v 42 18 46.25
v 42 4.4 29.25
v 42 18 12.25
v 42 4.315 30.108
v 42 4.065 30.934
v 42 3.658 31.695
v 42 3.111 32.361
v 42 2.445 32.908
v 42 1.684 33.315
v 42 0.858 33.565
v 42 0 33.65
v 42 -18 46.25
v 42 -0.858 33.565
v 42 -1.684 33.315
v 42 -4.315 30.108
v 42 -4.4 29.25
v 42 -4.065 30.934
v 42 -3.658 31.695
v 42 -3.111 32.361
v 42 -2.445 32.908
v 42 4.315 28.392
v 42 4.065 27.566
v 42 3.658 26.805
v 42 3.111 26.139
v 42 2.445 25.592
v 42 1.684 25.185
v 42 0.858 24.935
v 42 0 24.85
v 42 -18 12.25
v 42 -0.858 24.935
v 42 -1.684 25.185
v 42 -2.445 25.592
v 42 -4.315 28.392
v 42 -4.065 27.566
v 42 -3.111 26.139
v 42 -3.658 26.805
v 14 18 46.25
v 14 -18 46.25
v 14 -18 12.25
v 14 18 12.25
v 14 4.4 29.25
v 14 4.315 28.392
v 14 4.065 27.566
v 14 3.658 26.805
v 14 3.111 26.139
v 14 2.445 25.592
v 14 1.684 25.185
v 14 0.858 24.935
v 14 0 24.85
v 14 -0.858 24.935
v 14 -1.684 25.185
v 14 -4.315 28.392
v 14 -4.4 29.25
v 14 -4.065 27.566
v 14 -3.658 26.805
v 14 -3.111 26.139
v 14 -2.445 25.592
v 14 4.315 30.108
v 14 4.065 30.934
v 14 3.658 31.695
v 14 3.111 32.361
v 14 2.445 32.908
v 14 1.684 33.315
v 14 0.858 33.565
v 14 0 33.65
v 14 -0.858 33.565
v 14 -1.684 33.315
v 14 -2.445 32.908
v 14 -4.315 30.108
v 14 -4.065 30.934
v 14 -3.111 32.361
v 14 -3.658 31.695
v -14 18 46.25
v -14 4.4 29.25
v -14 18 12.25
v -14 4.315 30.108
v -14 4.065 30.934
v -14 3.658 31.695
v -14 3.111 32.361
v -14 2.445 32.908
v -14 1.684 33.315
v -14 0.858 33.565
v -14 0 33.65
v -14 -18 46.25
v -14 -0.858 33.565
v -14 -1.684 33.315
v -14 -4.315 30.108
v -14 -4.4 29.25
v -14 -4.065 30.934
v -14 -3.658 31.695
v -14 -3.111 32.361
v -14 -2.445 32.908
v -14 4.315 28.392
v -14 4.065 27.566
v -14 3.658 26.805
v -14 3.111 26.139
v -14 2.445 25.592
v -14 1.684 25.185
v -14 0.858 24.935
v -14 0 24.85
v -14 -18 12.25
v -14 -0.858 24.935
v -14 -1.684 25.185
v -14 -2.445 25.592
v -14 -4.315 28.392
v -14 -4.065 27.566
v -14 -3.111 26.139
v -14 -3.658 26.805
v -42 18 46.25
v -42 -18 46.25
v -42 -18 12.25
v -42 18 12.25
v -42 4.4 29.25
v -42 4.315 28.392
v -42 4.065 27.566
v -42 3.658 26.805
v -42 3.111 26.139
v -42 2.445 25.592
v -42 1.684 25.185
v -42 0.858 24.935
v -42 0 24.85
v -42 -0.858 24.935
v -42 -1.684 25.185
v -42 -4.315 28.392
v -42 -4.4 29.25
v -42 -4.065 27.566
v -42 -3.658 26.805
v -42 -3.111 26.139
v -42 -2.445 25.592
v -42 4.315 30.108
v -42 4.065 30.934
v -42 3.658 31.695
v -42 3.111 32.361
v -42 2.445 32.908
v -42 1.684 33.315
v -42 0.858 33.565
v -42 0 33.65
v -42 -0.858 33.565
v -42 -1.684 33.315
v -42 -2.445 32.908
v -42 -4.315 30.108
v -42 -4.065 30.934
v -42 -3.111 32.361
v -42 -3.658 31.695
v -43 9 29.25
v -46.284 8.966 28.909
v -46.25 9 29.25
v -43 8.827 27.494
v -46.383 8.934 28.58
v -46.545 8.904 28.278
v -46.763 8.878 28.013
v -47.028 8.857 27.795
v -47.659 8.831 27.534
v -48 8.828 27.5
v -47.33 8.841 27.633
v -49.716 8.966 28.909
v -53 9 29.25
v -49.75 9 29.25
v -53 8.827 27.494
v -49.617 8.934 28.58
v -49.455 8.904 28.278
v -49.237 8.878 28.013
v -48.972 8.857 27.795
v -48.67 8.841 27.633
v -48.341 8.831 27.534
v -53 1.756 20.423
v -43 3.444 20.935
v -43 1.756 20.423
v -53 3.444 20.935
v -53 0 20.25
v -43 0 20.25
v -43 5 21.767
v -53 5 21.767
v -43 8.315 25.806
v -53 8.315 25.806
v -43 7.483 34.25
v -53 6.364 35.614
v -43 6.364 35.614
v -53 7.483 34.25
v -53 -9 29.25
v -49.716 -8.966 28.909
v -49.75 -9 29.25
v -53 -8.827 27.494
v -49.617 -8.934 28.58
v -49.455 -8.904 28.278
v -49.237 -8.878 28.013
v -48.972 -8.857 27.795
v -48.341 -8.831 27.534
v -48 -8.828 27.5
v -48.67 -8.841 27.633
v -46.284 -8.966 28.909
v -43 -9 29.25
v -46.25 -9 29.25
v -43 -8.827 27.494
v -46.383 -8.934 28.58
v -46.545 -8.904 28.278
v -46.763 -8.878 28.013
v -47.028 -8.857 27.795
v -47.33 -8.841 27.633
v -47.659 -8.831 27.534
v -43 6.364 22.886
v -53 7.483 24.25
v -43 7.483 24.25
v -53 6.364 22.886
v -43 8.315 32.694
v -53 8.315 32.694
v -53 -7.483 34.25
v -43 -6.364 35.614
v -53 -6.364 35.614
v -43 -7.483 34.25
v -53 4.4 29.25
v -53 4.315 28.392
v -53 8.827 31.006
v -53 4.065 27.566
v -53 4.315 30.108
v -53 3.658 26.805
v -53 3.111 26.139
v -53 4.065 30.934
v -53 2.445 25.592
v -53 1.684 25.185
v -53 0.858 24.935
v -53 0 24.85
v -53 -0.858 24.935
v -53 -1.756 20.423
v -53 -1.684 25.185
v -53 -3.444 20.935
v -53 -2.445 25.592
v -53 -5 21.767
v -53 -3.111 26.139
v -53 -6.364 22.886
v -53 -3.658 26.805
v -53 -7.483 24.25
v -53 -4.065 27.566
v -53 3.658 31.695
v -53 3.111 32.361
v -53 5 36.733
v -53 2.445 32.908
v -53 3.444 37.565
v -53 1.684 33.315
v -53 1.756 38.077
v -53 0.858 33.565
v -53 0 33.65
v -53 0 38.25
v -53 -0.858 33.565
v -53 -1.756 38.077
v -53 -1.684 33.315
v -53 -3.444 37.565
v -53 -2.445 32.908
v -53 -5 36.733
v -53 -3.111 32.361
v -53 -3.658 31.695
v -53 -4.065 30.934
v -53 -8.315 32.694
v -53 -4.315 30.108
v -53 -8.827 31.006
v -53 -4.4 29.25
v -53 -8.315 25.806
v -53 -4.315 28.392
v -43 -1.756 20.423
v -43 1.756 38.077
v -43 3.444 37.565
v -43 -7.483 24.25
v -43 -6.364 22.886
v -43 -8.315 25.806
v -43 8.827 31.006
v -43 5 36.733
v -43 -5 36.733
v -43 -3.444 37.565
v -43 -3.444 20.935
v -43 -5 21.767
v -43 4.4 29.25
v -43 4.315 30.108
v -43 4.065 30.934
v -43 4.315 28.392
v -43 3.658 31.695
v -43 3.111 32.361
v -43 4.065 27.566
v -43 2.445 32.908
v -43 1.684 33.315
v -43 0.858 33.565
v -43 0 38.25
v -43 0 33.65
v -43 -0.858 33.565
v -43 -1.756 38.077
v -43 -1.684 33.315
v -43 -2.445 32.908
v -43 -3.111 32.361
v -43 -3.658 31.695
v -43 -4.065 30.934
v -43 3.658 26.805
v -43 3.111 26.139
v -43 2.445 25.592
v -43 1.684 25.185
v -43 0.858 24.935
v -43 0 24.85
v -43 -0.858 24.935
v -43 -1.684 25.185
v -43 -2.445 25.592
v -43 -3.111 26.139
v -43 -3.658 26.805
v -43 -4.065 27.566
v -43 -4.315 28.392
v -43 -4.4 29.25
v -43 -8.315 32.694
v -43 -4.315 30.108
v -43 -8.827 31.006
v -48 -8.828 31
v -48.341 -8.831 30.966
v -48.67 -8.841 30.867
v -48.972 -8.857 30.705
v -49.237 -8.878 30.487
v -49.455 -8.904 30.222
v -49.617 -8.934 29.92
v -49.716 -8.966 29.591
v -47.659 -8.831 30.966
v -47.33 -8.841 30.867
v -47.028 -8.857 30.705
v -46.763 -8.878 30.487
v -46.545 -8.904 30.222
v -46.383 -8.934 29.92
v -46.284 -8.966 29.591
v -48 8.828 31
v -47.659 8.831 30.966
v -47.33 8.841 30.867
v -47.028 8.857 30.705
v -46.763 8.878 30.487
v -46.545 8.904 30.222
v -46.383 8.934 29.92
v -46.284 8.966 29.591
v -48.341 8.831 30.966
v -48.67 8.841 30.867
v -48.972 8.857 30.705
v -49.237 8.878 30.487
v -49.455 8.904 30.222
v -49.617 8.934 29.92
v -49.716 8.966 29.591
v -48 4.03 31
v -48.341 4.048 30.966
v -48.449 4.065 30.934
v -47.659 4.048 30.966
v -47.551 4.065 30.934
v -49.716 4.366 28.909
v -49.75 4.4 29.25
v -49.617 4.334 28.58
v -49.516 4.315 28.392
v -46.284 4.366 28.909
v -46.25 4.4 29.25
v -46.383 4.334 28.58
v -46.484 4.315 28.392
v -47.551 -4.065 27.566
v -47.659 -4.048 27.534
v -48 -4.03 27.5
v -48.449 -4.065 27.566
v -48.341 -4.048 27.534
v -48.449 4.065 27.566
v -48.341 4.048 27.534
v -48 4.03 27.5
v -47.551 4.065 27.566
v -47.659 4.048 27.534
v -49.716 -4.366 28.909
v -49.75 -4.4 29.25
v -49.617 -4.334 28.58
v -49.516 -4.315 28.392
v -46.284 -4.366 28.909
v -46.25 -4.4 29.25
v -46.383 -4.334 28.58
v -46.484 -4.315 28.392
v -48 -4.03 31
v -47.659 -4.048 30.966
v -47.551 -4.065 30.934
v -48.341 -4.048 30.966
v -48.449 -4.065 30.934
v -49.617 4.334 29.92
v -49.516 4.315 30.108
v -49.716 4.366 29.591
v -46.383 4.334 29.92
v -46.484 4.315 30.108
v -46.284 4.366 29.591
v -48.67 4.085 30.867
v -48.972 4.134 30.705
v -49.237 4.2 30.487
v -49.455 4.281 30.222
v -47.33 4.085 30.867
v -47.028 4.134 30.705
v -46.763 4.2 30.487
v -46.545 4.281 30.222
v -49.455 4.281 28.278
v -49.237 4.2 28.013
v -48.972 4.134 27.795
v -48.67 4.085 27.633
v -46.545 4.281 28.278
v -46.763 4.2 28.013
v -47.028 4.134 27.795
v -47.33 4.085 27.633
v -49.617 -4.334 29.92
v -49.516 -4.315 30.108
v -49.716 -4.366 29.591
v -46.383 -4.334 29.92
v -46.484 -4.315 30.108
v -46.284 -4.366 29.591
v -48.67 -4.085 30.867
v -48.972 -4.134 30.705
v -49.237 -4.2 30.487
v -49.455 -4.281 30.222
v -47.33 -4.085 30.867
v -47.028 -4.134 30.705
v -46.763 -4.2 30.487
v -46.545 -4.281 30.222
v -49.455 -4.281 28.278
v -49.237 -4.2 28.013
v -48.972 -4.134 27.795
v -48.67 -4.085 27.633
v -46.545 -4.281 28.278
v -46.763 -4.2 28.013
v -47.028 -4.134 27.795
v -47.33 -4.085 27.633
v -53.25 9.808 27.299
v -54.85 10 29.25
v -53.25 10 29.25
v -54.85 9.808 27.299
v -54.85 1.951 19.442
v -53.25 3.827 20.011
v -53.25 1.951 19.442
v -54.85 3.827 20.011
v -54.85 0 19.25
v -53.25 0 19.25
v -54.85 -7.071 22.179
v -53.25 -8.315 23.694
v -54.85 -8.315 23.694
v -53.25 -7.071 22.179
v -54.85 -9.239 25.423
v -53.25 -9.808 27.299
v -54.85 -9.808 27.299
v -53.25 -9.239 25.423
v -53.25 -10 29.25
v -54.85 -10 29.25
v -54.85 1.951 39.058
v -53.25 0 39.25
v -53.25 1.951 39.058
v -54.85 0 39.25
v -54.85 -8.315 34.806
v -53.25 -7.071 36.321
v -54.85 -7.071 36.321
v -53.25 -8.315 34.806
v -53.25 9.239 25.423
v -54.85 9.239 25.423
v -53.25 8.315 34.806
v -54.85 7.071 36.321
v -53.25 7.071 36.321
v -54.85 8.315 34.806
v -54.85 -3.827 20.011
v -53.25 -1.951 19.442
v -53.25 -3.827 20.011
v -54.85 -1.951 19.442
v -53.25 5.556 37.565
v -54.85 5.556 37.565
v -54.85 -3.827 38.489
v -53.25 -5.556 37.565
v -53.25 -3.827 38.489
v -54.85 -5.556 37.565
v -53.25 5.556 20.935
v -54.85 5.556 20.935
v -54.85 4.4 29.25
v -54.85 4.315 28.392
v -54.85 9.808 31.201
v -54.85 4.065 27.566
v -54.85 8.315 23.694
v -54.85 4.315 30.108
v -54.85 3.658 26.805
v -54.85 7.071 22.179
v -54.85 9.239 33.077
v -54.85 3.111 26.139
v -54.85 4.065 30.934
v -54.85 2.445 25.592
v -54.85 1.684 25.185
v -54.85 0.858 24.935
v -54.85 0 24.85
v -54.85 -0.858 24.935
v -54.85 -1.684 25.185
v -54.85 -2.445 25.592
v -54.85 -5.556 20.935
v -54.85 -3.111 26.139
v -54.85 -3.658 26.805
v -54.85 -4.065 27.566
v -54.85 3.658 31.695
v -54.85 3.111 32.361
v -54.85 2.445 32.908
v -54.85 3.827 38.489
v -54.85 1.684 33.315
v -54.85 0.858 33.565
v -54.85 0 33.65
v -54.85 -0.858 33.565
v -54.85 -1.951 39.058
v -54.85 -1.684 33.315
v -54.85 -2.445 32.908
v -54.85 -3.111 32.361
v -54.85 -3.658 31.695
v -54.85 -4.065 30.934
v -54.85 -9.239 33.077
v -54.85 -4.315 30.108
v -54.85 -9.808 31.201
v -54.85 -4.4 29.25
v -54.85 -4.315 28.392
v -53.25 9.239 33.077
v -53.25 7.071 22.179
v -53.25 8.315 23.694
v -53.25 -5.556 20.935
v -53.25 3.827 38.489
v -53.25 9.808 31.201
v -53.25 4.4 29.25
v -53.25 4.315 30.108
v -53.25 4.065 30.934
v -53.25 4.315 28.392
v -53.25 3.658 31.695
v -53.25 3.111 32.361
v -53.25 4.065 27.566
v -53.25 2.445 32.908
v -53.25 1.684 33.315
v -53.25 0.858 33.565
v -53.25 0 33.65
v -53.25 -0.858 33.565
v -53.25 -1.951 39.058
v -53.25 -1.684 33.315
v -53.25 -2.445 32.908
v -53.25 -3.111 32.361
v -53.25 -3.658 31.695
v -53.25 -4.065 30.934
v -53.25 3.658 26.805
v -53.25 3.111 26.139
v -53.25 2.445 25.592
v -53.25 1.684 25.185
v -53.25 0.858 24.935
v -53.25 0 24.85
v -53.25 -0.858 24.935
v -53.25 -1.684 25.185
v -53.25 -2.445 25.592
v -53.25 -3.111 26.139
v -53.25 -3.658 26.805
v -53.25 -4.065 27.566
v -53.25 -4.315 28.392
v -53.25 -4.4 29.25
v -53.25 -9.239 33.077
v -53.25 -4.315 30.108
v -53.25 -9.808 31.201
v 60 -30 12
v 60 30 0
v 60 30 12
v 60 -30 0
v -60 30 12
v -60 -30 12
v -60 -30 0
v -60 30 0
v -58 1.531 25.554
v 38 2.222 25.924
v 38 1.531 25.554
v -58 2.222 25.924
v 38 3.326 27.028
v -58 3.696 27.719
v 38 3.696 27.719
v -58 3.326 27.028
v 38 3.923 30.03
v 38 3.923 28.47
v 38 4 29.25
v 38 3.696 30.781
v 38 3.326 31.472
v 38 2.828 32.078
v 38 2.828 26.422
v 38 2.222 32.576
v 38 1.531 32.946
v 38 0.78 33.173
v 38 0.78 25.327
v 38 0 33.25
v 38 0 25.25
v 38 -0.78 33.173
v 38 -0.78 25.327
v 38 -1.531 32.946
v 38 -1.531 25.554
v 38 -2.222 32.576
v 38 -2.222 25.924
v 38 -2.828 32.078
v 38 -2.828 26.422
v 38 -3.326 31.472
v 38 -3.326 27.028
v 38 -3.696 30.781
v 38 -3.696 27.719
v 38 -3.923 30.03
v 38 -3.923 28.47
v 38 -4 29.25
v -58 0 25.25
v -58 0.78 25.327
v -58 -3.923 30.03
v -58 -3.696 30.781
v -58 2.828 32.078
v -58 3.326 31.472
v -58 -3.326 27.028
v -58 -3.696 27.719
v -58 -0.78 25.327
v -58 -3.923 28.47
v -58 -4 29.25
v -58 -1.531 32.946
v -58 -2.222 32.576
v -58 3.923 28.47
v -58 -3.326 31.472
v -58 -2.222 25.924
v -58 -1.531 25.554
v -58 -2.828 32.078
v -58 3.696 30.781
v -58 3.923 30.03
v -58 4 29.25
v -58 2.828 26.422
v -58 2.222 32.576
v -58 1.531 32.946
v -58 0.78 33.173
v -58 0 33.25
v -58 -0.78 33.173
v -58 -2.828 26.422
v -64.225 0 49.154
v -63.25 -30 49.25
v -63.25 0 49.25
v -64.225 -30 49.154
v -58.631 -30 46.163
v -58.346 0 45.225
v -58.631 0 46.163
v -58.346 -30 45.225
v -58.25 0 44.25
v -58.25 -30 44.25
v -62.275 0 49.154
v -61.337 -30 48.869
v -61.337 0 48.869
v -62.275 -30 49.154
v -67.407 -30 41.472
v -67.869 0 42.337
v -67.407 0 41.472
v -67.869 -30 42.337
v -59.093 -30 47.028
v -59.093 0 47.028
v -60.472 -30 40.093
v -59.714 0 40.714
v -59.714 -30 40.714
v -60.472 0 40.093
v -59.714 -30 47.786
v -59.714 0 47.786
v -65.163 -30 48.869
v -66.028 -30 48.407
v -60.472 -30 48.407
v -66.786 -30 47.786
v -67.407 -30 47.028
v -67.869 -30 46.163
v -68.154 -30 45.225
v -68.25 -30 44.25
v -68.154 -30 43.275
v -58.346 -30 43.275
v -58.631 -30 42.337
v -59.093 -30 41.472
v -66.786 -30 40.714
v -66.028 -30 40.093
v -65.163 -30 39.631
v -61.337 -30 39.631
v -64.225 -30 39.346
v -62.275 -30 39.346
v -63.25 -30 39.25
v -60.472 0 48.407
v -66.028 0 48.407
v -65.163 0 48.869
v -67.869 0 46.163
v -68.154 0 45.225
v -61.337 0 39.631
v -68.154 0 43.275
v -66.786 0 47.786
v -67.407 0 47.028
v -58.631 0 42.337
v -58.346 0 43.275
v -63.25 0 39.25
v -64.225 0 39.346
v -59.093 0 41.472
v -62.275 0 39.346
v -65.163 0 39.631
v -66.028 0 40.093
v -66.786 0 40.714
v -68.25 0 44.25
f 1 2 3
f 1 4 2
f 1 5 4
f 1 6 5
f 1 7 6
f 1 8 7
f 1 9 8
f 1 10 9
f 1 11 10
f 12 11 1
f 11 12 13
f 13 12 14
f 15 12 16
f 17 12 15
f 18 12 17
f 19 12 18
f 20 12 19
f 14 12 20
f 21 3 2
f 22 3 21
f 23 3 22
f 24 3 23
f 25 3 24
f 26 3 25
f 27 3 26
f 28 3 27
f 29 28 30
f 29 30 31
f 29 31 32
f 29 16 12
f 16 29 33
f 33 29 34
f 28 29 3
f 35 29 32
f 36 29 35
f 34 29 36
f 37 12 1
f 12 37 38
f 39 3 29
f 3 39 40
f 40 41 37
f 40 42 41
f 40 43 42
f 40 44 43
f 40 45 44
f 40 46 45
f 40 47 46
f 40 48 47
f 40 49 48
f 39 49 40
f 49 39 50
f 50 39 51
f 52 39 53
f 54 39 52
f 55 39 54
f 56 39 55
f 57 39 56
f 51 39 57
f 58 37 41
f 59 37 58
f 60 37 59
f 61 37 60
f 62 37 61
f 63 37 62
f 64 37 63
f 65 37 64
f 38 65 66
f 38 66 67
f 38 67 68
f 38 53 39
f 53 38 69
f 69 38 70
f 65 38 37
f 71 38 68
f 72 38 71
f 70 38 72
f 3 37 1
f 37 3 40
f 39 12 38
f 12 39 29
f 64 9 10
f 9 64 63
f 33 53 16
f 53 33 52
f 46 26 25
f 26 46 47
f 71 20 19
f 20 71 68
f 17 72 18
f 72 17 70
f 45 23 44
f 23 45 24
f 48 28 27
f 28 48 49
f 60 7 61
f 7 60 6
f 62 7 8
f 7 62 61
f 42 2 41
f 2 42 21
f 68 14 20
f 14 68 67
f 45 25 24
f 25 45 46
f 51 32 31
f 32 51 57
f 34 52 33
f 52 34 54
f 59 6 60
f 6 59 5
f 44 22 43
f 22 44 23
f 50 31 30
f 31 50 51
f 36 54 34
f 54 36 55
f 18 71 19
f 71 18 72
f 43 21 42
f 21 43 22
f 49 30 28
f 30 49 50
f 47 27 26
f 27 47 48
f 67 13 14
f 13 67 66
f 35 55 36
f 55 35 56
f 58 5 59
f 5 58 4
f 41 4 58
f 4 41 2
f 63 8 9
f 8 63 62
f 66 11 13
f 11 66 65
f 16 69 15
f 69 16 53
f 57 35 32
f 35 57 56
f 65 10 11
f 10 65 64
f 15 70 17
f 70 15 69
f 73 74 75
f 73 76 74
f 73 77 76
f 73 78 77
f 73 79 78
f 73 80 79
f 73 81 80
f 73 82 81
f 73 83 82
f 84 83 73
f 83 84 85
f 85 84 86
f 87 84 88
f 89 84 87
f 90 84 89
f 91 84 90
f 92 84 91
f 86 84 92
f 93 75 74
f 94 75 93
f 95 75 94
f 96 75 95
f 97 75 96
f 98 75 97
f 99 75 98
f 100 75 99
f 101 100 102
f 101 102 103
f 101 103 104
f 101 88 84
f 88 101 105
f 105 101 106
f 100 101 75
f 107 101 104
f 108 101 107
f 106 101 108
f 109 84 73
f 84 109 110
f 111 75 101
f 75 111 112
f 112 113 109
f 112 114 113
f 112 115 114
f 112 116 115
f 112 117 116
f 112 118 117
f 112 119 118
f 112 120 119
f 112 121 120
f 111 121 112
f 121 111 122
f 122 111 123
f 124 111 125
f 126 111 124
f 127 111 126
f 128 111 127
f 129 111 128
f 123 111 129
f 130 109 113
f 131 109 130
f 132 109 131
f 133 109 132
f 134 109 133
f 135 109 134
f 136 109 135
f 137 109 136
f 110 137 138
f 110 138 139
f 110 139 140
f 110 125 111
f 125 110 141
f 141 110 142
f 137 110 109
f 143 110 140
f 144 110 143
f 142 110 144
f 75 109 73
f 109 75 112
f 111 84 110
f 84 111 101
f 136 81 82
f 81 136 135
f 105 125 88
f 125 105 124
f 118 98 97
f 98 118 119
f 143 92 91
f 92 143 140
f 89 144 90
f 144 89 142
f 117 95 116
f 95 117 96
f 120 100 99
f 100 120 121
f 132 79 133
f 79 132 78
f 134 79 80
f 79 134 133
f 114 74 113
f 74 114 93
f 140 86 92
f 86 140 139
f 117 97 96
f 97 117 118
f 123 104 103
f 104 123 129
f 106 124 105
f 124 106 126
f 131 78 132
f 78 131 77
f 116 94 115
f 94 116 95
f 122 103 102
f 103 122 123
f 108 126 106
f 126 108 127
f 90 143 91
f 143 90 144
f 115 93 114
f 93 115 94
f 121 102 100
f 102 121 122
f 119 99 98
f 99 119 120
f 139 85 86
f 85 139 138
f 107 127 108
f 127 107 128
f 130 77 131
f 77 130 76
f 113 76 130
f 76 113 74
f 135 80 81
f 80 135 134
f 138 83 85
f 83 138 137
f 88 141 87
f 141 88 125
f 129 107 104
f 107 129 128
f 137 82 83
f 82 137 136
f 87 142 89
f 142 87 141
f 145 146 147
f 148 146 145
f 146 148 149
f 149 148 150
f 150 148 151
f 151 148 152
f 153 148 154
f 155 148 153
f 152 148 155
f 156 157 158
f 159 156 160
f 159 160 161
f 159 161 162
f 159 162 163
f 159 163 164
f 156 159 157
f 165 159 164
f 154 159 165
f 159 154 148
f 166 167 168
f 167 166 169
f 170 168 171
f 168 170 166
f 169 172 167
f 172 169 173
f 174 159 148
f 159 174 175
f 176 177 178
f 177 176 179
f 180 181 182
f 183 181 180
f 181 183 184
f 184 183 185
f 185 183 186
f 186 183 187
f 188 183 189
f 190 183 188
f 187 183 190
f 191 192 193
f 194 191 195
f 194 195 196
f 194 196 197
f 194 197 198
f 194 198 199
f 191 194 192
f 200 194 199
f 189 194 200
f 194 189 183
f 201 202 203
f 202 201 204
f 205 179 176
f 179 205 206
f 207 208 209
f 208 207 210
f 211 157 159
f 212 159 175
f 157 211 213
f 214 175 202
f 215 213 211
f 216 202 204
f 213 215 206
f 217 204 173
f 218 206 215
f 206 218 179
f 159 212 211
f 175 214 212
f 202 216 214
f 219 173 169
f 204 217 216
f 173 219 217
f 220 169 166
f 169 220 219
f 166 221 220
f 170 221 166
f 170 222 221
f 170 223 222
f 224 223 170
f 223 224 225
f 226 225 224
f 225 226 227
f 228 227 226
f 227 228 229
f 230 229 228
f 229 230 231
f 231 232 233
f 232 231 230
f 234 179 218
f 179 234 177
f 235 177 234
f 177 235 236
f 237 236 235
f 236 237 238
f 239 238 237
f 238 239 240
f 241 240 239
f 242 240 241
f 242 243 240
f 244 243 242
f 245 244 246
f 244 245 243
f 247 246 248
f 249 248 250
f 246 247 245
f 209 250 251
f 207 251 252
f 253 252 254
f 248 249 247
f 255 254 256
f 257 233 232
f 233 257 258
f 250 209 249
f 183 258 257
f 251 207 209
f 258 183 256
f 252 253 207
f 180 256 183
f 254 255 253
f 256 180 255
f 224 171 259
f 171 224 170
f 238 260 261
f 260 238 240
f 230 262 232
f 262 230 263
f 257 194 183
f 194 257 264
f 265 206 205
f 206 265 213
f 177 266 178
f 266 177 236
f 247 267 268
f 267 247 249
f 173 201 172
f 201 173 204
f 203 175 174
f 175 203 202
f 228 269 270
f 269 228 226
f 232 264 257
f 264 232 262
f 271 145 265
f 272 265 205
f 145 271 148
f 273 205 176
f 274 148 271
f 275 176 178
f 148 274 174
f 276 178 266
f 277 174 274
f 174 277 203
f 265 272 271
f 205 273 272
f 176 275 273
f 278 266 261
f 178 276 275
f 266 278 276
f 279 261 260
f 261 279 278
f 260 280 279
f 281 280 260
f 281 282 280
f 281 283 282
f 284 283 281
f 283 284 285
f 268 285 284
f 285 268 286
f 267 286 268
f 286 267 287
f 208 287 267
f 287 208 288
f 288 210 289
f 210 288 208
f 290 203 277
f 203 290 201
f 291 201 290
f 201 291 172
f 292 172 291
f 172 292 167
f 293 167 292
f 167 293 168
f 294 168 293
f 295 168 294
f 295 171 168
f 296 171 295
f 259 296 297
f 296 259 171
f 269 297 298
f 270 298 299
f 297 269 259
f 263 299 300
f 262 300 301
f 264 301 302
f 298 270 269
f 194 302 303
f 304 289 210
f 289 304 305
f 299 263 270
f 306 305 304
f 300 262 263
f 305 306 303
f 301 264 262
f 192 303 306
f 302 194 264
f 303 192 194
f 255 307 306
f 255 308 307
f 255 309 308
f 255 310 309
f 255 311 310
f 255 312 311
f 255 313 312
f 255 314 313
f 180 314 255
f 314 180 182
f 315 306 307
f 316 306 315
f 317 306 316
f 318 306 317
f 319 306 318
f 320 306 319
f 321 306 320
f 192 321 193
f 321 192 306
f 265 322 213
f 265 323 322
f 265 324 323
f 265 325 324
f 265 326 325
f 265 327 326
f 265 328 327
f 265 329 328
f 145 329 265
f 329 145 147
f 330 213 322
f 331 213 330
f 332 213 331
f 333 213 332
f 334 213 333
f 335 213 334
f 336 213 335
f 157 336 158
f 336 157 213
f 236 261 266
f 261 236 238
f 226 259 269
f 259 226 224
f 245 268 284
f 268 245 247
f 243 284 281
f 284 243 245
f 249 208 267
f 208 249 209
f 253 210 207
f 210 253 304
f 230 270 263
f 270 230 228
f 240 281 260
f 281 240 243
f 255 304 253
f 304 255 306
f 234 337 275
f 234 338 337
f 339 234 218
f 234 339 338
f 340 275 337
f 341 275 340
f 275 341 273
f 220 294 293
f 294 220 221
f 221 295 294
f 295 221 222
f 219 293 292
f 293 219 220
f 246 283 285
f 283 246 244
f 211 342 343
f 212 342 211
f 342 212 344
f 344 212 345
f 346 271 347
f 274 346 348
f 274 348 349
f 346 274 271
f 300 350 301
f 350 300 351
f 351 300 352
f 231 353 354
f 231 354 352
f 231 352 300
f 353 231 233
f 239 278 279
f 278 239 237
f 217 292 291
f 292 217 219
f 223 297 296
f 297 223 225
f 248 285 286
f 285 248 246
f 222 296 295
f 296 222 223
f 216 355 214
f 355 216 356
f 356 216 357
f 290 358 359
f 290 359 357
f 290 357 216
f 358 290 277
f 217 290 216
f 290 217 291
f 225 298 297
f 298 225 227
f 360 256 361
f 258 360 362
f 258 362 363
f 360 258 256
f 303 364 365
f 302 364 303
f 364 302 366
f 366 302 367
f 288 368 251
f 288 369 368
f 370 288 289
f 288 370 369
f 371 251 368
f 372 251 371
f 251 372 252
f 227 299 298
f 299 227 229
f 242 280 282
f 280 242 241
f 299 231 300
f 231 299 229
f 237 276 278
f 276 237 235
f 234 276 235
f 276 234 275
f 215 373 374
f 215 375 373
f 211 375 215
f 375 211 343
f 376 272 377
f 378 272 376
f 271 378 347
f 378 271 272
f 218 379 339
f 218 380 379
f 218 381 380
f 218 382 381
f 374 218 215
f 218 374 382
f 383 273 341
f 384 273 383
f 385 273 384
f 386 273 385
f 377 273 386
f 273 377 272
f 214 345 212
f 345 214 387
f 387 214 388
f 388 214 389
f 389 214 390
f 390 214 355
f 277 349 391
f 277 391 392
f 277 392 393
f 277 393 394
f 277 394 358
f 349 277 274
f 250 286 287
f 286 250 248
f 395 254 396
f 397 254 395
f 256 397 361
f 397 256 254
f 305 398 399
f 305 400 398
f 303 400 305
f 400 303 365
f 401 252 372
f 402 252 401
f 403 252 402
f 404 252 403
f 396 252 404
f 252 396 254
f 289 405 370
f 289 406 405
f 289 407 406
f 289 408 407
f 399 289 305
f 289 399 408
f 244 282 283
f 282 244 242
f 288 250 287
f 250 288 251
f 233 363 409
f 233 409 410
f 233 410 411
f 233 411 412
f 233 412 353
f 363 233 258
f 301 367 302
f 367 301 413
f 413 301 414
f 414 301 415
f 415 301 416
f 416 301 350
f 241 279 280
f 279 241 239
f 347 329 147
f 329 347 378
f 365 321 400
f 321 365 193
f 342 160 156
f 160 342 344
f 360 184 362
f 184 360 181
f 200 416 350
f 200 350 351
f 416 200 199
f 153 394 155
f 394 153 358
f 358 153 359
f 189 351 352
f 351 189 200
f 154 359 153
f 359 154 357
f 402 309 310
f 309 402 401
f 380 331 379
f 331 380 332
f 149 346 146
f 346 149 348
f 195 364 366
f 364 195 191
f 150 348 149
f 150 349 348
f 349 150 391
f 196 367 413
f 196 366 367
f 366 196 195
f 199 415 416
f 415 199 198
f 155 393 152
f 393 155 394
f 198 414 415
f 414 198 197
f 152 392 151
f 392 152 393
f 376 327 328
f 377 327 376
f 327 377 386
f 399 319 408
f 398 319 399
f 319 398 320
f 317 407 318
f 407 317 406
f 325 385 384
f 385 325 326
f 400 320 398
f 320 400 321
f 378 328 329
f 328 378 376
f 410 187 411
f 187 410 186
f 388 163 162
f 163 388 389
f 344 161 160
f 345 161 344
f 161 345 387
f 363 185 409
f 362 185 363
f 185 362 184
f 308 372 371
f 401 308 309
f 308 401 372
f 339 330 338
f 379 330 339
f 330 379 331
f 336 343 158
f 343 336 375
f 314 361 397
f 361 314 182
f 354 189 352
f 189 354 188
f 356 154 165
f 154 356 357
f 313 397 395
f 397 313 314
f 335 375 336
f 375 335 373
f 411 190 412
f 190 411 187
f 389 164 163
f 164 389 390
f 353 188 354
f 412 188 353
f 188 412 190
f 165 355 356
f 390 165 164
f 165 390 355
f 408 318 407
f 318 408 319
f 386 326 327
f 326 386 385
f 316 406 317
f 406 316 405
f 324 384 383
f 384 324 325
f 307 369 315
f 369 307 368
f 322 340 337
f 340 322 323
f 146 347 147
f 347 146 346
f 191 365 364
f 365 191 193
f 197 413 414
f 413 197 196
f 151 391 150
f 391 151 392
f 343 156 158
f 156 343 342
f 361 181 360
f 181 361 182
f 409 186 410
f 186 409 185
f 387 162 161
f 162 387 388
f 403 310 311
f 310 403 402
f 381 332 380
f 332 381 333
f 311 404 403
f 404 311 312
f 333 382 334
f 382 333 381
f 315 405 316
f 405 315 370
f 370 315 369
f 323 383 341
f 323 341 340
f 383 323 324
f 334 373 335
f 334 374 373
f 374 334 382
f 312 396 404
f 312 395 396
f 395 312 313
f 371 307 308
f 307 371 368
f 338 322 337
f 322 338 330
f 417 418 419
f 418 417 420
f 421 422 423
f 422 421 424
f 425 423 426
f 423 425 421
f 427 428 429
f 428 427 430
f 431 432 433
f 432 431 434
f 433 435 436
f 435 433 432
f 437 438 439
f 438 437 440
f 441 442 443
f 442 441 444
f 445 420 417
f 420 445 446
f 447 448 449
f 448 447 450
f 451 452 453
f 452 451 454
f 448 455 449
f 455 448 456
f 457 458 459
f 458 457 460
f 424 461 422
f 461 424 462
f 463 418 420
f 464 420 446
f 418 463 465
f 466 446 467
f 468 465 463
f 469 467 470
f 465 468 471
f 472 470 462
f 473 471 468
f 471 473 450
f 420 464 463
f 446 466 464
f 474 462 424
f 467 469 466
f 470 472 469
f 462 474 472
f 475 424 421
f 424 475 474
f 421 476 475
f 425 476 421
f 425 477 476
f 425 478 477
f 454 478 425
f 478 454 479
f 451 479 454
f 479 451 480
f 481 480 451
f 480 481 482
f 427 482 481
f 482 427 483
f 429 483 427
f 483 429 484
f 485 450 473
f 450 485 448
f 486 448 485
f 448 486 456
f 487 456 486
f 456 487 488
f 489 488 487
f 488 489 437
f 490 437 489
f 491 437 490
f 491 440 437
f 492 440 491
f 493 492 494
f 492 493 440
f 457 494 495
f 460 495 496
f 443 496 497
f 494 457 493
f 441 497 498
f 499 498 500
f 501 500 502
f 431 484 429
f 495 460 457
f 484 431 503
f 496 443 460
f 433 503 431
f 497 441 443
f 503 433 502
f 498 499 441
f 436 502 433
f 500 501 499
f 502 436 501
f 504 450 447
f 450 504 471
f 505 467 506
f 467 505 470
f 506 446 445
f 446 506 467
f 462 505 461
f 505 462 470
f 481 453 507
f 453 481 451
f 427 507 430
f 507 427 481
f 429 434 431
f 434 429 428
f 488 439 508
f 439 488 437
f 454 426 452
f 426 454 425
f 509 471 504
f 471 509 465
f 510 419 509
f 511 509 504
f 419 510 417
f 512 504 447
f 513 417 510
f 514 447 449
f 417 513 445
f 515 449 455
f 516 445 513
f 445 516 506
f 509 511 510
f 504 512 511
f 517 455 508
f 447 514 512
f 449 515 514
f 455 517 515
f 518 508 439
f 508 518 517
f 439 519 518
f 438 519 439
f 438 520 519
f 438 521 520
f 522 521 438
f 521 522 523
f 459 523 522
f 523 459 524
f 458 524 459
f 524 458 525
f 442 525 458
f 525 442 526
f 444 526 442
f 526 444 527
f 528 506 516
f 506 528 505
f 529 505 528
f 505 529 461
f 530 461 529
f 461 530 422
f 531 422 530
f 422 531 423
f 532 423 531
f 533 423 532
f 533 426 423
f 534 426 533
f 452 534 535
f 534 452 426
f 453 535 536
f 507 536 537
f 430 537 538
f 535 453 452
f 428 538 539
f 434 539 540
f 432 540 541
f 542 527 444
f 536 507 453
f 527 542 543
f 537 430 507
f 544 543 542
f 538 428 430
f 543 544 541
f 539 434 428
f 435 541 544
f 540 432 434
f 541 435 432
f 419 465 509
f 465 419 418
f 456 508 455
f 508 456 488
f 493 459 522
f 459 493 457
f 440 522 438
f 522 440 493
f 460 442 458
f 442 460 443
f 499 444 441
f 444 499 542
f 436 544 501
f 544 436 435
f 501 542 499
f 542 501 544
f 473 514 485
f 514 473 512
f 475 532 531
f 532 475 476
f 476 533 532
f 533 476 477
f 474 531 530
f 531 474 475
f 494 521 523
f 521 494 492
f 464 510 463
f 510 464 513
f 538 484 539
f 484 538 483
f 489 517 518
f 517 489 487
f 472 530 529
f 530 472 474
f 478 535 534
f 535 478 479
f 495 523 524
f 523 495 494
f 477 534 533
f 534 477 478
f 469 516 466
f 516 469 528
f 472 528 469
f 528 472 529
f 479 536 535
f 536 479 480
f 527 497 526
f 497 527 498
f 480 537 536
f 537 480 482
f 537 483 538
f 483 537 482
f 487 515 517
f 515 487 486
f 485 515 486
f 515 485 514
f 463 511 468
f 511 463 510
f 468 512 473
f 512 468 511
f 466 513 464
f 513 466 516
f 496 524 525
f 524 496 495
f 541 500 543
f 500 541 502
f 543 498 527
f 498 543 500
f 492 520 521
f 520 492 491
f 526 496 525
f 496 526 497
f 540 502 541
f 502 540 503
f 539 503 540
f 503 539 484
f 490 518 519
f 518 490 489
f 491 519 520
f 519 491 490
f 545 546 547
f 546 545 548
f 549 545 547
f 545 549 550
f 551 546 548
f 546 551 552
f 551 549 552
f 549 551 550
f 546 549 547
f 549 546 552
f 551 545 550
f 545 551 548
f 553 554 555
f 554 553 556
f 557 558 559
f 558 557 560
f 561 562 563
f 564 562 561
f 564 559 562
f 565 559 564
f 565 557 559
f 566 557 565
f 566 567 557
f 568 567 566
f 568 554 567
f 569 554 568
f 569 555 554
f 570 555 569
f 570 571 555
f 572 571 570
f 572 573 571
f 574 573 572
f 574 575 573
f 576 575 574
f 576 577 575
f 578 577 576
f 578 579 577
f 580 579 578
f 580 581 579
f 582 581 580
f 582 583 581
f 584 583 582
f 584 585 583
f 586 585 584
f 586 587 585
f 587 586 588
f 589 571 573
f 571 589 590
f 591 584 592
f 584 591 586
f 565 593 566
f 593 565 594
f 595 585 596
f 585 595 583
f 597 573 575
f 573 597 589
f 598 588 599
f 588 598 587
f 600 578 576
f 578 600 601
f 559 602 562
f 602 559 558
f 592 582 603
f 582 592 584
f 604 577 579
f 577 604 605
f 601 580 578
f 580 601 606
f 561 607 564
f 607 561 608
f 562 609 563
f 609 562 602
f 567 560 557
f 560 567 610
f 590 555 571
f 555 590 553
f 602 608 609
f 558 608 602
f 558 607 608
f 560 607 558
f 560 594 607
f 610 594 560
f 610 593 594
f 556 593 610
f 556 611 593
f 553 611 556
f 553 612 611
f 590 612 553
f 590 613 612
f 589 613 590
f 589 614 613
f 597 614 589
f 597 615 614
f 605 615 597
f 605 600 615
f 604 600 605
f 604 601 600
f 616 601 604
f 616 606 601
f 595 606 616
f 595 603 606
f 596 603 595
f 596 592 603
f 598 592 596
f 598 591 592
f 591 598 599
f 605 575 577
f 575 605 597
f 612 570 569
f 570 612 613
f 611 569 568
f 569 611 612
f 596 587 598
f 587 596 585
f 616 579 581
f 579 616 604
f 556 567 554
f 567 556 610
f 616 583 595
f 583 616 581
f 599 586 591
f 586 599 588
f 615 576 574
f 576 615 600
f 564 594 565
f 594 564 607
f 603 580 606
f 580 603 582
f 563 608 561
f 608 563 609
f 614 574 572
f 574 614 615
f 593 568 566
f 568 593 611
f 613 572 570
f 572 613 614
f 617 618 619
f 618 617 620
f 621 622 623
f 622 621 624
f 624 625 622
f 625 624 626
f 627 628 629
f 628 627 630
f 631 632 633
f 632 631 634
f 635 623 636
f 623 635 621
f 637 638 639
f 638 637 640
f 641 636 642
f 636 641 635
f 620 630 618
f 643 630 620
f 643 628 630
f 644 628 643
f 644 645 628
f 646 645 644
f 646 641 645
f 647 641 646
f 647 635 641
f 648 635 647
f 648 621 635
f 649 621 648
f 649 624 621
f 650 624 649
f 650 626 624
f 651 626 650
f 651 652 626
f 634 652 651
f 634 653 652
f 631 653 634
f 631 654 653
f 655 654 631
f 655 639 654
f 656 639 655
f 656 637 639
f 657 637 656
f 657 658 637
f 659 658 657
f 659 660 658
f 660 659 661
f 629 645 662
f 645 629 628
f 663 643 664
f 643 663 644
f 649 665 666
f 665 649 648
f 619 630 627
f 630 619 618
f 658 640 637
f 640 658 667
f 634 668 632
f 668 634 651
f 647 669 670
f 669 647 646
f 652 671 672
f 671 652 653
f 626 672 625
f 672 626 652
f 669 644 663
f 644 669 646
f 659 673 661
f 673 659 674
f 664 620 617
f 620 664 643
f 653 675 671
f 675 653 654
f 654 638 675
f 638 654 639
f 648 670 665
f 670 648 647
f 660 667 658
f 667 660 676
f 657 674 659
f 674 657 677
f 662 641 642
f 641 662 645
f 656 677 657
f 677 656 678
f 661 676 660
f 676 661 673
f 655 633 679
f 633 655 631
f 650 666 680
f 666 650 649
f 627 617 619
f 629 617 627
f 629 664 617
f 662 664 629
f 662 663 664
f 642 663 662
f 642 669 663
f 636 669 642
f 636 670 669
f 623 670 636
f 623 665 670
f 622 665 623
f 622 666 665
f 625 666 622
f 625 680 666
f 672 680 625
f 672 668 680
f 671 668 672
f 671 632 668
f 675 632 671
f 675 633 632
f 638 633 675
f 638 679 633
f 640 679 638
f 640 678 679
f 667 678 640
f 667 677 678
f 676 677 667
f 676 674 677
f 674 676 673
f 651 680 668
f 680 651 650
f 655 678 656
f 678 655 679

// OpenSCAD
$fn = 32;

// ------------------------------------------------------------------------
// Machine vise: screw d8, jaws 28 x 34 mm
// Every part is its own module, assembly() places every instance.
// ------------------------------------------------------------------------

// --- part 1 ---
module vise_bed() {
  difference() {
    translate([-60, -30, 0]) cube([120, 60, 12]);
  }
}

// --- part 2 ---
module vise_jaw() {
  difference() {
    translate([-14, -18, 0]) cube([28, 36, 34]);
    translate([0, 0, 17]) rotate([0, 90, 0]) cylinder(h = 30, d = 8.8, center = true);
  }
}

// --- part 3 ---
module vise_screw() {
  translate([0, 0, -48]) cylinder(h = 96, d = 8);
}

// --- part 4 ---
module screw_collar() {
  difference() {
    cylinder(h = 10, d = 18);
    translate([0, 0, -1]) cylinder(h = 12, d = 8.8);
    translate([0, 0, 5]) rotate([90, 0, 0]) cylinder(h = 20, d = 3.5, center = true);
  }
}

// --- part 5 ---
module screw_washer() {
  difference() {
      translate([0, 0, 0]) cylinder(h = 1.6, d = 20);
      translate([0, 0, -1]) cylinder(h = 3.6, d = 8.8);
    }
}

// --- part 6 ---
module vise_handle() {
  cylinder(h = 30, d = 10);
}

// --- assembly ---
module assembly() {
  color([0.80, 0.24, 0.20]) translate([0, 0, 0]) rotate([0, 0, 0]) vise_bed();
  color([0.20, 0.45, 0.75]) translate([28, 0, 12.25]) rotate([0, 0, 0]) vise_jaw();
  color([0.25, 0.62, 0.32]) translate([-28, 0, 12.25]) rotate([0, 0, 0]) vise_jaw();
  color([0.92, 0.70, 0.18]) translate([-10, 0, 29.25]) rotate([0, 90, 0]) vise_screw();
  color([0.58, 0.35, 0.70]) translate([-53, 0, 29.25]) rotate([0, 90, 0]) screw_collar();
  color([0.16, 0.66, 0.66]) translate([-54.85, 0, 29.25]) rotate([0, 90, 0]) screw_washer();
  color([0.85, 0.48, 0.18]) translate([-63.25, 0, 44.25]) rotate([90, 0, 0]) vise_handle();
}

assembly();
